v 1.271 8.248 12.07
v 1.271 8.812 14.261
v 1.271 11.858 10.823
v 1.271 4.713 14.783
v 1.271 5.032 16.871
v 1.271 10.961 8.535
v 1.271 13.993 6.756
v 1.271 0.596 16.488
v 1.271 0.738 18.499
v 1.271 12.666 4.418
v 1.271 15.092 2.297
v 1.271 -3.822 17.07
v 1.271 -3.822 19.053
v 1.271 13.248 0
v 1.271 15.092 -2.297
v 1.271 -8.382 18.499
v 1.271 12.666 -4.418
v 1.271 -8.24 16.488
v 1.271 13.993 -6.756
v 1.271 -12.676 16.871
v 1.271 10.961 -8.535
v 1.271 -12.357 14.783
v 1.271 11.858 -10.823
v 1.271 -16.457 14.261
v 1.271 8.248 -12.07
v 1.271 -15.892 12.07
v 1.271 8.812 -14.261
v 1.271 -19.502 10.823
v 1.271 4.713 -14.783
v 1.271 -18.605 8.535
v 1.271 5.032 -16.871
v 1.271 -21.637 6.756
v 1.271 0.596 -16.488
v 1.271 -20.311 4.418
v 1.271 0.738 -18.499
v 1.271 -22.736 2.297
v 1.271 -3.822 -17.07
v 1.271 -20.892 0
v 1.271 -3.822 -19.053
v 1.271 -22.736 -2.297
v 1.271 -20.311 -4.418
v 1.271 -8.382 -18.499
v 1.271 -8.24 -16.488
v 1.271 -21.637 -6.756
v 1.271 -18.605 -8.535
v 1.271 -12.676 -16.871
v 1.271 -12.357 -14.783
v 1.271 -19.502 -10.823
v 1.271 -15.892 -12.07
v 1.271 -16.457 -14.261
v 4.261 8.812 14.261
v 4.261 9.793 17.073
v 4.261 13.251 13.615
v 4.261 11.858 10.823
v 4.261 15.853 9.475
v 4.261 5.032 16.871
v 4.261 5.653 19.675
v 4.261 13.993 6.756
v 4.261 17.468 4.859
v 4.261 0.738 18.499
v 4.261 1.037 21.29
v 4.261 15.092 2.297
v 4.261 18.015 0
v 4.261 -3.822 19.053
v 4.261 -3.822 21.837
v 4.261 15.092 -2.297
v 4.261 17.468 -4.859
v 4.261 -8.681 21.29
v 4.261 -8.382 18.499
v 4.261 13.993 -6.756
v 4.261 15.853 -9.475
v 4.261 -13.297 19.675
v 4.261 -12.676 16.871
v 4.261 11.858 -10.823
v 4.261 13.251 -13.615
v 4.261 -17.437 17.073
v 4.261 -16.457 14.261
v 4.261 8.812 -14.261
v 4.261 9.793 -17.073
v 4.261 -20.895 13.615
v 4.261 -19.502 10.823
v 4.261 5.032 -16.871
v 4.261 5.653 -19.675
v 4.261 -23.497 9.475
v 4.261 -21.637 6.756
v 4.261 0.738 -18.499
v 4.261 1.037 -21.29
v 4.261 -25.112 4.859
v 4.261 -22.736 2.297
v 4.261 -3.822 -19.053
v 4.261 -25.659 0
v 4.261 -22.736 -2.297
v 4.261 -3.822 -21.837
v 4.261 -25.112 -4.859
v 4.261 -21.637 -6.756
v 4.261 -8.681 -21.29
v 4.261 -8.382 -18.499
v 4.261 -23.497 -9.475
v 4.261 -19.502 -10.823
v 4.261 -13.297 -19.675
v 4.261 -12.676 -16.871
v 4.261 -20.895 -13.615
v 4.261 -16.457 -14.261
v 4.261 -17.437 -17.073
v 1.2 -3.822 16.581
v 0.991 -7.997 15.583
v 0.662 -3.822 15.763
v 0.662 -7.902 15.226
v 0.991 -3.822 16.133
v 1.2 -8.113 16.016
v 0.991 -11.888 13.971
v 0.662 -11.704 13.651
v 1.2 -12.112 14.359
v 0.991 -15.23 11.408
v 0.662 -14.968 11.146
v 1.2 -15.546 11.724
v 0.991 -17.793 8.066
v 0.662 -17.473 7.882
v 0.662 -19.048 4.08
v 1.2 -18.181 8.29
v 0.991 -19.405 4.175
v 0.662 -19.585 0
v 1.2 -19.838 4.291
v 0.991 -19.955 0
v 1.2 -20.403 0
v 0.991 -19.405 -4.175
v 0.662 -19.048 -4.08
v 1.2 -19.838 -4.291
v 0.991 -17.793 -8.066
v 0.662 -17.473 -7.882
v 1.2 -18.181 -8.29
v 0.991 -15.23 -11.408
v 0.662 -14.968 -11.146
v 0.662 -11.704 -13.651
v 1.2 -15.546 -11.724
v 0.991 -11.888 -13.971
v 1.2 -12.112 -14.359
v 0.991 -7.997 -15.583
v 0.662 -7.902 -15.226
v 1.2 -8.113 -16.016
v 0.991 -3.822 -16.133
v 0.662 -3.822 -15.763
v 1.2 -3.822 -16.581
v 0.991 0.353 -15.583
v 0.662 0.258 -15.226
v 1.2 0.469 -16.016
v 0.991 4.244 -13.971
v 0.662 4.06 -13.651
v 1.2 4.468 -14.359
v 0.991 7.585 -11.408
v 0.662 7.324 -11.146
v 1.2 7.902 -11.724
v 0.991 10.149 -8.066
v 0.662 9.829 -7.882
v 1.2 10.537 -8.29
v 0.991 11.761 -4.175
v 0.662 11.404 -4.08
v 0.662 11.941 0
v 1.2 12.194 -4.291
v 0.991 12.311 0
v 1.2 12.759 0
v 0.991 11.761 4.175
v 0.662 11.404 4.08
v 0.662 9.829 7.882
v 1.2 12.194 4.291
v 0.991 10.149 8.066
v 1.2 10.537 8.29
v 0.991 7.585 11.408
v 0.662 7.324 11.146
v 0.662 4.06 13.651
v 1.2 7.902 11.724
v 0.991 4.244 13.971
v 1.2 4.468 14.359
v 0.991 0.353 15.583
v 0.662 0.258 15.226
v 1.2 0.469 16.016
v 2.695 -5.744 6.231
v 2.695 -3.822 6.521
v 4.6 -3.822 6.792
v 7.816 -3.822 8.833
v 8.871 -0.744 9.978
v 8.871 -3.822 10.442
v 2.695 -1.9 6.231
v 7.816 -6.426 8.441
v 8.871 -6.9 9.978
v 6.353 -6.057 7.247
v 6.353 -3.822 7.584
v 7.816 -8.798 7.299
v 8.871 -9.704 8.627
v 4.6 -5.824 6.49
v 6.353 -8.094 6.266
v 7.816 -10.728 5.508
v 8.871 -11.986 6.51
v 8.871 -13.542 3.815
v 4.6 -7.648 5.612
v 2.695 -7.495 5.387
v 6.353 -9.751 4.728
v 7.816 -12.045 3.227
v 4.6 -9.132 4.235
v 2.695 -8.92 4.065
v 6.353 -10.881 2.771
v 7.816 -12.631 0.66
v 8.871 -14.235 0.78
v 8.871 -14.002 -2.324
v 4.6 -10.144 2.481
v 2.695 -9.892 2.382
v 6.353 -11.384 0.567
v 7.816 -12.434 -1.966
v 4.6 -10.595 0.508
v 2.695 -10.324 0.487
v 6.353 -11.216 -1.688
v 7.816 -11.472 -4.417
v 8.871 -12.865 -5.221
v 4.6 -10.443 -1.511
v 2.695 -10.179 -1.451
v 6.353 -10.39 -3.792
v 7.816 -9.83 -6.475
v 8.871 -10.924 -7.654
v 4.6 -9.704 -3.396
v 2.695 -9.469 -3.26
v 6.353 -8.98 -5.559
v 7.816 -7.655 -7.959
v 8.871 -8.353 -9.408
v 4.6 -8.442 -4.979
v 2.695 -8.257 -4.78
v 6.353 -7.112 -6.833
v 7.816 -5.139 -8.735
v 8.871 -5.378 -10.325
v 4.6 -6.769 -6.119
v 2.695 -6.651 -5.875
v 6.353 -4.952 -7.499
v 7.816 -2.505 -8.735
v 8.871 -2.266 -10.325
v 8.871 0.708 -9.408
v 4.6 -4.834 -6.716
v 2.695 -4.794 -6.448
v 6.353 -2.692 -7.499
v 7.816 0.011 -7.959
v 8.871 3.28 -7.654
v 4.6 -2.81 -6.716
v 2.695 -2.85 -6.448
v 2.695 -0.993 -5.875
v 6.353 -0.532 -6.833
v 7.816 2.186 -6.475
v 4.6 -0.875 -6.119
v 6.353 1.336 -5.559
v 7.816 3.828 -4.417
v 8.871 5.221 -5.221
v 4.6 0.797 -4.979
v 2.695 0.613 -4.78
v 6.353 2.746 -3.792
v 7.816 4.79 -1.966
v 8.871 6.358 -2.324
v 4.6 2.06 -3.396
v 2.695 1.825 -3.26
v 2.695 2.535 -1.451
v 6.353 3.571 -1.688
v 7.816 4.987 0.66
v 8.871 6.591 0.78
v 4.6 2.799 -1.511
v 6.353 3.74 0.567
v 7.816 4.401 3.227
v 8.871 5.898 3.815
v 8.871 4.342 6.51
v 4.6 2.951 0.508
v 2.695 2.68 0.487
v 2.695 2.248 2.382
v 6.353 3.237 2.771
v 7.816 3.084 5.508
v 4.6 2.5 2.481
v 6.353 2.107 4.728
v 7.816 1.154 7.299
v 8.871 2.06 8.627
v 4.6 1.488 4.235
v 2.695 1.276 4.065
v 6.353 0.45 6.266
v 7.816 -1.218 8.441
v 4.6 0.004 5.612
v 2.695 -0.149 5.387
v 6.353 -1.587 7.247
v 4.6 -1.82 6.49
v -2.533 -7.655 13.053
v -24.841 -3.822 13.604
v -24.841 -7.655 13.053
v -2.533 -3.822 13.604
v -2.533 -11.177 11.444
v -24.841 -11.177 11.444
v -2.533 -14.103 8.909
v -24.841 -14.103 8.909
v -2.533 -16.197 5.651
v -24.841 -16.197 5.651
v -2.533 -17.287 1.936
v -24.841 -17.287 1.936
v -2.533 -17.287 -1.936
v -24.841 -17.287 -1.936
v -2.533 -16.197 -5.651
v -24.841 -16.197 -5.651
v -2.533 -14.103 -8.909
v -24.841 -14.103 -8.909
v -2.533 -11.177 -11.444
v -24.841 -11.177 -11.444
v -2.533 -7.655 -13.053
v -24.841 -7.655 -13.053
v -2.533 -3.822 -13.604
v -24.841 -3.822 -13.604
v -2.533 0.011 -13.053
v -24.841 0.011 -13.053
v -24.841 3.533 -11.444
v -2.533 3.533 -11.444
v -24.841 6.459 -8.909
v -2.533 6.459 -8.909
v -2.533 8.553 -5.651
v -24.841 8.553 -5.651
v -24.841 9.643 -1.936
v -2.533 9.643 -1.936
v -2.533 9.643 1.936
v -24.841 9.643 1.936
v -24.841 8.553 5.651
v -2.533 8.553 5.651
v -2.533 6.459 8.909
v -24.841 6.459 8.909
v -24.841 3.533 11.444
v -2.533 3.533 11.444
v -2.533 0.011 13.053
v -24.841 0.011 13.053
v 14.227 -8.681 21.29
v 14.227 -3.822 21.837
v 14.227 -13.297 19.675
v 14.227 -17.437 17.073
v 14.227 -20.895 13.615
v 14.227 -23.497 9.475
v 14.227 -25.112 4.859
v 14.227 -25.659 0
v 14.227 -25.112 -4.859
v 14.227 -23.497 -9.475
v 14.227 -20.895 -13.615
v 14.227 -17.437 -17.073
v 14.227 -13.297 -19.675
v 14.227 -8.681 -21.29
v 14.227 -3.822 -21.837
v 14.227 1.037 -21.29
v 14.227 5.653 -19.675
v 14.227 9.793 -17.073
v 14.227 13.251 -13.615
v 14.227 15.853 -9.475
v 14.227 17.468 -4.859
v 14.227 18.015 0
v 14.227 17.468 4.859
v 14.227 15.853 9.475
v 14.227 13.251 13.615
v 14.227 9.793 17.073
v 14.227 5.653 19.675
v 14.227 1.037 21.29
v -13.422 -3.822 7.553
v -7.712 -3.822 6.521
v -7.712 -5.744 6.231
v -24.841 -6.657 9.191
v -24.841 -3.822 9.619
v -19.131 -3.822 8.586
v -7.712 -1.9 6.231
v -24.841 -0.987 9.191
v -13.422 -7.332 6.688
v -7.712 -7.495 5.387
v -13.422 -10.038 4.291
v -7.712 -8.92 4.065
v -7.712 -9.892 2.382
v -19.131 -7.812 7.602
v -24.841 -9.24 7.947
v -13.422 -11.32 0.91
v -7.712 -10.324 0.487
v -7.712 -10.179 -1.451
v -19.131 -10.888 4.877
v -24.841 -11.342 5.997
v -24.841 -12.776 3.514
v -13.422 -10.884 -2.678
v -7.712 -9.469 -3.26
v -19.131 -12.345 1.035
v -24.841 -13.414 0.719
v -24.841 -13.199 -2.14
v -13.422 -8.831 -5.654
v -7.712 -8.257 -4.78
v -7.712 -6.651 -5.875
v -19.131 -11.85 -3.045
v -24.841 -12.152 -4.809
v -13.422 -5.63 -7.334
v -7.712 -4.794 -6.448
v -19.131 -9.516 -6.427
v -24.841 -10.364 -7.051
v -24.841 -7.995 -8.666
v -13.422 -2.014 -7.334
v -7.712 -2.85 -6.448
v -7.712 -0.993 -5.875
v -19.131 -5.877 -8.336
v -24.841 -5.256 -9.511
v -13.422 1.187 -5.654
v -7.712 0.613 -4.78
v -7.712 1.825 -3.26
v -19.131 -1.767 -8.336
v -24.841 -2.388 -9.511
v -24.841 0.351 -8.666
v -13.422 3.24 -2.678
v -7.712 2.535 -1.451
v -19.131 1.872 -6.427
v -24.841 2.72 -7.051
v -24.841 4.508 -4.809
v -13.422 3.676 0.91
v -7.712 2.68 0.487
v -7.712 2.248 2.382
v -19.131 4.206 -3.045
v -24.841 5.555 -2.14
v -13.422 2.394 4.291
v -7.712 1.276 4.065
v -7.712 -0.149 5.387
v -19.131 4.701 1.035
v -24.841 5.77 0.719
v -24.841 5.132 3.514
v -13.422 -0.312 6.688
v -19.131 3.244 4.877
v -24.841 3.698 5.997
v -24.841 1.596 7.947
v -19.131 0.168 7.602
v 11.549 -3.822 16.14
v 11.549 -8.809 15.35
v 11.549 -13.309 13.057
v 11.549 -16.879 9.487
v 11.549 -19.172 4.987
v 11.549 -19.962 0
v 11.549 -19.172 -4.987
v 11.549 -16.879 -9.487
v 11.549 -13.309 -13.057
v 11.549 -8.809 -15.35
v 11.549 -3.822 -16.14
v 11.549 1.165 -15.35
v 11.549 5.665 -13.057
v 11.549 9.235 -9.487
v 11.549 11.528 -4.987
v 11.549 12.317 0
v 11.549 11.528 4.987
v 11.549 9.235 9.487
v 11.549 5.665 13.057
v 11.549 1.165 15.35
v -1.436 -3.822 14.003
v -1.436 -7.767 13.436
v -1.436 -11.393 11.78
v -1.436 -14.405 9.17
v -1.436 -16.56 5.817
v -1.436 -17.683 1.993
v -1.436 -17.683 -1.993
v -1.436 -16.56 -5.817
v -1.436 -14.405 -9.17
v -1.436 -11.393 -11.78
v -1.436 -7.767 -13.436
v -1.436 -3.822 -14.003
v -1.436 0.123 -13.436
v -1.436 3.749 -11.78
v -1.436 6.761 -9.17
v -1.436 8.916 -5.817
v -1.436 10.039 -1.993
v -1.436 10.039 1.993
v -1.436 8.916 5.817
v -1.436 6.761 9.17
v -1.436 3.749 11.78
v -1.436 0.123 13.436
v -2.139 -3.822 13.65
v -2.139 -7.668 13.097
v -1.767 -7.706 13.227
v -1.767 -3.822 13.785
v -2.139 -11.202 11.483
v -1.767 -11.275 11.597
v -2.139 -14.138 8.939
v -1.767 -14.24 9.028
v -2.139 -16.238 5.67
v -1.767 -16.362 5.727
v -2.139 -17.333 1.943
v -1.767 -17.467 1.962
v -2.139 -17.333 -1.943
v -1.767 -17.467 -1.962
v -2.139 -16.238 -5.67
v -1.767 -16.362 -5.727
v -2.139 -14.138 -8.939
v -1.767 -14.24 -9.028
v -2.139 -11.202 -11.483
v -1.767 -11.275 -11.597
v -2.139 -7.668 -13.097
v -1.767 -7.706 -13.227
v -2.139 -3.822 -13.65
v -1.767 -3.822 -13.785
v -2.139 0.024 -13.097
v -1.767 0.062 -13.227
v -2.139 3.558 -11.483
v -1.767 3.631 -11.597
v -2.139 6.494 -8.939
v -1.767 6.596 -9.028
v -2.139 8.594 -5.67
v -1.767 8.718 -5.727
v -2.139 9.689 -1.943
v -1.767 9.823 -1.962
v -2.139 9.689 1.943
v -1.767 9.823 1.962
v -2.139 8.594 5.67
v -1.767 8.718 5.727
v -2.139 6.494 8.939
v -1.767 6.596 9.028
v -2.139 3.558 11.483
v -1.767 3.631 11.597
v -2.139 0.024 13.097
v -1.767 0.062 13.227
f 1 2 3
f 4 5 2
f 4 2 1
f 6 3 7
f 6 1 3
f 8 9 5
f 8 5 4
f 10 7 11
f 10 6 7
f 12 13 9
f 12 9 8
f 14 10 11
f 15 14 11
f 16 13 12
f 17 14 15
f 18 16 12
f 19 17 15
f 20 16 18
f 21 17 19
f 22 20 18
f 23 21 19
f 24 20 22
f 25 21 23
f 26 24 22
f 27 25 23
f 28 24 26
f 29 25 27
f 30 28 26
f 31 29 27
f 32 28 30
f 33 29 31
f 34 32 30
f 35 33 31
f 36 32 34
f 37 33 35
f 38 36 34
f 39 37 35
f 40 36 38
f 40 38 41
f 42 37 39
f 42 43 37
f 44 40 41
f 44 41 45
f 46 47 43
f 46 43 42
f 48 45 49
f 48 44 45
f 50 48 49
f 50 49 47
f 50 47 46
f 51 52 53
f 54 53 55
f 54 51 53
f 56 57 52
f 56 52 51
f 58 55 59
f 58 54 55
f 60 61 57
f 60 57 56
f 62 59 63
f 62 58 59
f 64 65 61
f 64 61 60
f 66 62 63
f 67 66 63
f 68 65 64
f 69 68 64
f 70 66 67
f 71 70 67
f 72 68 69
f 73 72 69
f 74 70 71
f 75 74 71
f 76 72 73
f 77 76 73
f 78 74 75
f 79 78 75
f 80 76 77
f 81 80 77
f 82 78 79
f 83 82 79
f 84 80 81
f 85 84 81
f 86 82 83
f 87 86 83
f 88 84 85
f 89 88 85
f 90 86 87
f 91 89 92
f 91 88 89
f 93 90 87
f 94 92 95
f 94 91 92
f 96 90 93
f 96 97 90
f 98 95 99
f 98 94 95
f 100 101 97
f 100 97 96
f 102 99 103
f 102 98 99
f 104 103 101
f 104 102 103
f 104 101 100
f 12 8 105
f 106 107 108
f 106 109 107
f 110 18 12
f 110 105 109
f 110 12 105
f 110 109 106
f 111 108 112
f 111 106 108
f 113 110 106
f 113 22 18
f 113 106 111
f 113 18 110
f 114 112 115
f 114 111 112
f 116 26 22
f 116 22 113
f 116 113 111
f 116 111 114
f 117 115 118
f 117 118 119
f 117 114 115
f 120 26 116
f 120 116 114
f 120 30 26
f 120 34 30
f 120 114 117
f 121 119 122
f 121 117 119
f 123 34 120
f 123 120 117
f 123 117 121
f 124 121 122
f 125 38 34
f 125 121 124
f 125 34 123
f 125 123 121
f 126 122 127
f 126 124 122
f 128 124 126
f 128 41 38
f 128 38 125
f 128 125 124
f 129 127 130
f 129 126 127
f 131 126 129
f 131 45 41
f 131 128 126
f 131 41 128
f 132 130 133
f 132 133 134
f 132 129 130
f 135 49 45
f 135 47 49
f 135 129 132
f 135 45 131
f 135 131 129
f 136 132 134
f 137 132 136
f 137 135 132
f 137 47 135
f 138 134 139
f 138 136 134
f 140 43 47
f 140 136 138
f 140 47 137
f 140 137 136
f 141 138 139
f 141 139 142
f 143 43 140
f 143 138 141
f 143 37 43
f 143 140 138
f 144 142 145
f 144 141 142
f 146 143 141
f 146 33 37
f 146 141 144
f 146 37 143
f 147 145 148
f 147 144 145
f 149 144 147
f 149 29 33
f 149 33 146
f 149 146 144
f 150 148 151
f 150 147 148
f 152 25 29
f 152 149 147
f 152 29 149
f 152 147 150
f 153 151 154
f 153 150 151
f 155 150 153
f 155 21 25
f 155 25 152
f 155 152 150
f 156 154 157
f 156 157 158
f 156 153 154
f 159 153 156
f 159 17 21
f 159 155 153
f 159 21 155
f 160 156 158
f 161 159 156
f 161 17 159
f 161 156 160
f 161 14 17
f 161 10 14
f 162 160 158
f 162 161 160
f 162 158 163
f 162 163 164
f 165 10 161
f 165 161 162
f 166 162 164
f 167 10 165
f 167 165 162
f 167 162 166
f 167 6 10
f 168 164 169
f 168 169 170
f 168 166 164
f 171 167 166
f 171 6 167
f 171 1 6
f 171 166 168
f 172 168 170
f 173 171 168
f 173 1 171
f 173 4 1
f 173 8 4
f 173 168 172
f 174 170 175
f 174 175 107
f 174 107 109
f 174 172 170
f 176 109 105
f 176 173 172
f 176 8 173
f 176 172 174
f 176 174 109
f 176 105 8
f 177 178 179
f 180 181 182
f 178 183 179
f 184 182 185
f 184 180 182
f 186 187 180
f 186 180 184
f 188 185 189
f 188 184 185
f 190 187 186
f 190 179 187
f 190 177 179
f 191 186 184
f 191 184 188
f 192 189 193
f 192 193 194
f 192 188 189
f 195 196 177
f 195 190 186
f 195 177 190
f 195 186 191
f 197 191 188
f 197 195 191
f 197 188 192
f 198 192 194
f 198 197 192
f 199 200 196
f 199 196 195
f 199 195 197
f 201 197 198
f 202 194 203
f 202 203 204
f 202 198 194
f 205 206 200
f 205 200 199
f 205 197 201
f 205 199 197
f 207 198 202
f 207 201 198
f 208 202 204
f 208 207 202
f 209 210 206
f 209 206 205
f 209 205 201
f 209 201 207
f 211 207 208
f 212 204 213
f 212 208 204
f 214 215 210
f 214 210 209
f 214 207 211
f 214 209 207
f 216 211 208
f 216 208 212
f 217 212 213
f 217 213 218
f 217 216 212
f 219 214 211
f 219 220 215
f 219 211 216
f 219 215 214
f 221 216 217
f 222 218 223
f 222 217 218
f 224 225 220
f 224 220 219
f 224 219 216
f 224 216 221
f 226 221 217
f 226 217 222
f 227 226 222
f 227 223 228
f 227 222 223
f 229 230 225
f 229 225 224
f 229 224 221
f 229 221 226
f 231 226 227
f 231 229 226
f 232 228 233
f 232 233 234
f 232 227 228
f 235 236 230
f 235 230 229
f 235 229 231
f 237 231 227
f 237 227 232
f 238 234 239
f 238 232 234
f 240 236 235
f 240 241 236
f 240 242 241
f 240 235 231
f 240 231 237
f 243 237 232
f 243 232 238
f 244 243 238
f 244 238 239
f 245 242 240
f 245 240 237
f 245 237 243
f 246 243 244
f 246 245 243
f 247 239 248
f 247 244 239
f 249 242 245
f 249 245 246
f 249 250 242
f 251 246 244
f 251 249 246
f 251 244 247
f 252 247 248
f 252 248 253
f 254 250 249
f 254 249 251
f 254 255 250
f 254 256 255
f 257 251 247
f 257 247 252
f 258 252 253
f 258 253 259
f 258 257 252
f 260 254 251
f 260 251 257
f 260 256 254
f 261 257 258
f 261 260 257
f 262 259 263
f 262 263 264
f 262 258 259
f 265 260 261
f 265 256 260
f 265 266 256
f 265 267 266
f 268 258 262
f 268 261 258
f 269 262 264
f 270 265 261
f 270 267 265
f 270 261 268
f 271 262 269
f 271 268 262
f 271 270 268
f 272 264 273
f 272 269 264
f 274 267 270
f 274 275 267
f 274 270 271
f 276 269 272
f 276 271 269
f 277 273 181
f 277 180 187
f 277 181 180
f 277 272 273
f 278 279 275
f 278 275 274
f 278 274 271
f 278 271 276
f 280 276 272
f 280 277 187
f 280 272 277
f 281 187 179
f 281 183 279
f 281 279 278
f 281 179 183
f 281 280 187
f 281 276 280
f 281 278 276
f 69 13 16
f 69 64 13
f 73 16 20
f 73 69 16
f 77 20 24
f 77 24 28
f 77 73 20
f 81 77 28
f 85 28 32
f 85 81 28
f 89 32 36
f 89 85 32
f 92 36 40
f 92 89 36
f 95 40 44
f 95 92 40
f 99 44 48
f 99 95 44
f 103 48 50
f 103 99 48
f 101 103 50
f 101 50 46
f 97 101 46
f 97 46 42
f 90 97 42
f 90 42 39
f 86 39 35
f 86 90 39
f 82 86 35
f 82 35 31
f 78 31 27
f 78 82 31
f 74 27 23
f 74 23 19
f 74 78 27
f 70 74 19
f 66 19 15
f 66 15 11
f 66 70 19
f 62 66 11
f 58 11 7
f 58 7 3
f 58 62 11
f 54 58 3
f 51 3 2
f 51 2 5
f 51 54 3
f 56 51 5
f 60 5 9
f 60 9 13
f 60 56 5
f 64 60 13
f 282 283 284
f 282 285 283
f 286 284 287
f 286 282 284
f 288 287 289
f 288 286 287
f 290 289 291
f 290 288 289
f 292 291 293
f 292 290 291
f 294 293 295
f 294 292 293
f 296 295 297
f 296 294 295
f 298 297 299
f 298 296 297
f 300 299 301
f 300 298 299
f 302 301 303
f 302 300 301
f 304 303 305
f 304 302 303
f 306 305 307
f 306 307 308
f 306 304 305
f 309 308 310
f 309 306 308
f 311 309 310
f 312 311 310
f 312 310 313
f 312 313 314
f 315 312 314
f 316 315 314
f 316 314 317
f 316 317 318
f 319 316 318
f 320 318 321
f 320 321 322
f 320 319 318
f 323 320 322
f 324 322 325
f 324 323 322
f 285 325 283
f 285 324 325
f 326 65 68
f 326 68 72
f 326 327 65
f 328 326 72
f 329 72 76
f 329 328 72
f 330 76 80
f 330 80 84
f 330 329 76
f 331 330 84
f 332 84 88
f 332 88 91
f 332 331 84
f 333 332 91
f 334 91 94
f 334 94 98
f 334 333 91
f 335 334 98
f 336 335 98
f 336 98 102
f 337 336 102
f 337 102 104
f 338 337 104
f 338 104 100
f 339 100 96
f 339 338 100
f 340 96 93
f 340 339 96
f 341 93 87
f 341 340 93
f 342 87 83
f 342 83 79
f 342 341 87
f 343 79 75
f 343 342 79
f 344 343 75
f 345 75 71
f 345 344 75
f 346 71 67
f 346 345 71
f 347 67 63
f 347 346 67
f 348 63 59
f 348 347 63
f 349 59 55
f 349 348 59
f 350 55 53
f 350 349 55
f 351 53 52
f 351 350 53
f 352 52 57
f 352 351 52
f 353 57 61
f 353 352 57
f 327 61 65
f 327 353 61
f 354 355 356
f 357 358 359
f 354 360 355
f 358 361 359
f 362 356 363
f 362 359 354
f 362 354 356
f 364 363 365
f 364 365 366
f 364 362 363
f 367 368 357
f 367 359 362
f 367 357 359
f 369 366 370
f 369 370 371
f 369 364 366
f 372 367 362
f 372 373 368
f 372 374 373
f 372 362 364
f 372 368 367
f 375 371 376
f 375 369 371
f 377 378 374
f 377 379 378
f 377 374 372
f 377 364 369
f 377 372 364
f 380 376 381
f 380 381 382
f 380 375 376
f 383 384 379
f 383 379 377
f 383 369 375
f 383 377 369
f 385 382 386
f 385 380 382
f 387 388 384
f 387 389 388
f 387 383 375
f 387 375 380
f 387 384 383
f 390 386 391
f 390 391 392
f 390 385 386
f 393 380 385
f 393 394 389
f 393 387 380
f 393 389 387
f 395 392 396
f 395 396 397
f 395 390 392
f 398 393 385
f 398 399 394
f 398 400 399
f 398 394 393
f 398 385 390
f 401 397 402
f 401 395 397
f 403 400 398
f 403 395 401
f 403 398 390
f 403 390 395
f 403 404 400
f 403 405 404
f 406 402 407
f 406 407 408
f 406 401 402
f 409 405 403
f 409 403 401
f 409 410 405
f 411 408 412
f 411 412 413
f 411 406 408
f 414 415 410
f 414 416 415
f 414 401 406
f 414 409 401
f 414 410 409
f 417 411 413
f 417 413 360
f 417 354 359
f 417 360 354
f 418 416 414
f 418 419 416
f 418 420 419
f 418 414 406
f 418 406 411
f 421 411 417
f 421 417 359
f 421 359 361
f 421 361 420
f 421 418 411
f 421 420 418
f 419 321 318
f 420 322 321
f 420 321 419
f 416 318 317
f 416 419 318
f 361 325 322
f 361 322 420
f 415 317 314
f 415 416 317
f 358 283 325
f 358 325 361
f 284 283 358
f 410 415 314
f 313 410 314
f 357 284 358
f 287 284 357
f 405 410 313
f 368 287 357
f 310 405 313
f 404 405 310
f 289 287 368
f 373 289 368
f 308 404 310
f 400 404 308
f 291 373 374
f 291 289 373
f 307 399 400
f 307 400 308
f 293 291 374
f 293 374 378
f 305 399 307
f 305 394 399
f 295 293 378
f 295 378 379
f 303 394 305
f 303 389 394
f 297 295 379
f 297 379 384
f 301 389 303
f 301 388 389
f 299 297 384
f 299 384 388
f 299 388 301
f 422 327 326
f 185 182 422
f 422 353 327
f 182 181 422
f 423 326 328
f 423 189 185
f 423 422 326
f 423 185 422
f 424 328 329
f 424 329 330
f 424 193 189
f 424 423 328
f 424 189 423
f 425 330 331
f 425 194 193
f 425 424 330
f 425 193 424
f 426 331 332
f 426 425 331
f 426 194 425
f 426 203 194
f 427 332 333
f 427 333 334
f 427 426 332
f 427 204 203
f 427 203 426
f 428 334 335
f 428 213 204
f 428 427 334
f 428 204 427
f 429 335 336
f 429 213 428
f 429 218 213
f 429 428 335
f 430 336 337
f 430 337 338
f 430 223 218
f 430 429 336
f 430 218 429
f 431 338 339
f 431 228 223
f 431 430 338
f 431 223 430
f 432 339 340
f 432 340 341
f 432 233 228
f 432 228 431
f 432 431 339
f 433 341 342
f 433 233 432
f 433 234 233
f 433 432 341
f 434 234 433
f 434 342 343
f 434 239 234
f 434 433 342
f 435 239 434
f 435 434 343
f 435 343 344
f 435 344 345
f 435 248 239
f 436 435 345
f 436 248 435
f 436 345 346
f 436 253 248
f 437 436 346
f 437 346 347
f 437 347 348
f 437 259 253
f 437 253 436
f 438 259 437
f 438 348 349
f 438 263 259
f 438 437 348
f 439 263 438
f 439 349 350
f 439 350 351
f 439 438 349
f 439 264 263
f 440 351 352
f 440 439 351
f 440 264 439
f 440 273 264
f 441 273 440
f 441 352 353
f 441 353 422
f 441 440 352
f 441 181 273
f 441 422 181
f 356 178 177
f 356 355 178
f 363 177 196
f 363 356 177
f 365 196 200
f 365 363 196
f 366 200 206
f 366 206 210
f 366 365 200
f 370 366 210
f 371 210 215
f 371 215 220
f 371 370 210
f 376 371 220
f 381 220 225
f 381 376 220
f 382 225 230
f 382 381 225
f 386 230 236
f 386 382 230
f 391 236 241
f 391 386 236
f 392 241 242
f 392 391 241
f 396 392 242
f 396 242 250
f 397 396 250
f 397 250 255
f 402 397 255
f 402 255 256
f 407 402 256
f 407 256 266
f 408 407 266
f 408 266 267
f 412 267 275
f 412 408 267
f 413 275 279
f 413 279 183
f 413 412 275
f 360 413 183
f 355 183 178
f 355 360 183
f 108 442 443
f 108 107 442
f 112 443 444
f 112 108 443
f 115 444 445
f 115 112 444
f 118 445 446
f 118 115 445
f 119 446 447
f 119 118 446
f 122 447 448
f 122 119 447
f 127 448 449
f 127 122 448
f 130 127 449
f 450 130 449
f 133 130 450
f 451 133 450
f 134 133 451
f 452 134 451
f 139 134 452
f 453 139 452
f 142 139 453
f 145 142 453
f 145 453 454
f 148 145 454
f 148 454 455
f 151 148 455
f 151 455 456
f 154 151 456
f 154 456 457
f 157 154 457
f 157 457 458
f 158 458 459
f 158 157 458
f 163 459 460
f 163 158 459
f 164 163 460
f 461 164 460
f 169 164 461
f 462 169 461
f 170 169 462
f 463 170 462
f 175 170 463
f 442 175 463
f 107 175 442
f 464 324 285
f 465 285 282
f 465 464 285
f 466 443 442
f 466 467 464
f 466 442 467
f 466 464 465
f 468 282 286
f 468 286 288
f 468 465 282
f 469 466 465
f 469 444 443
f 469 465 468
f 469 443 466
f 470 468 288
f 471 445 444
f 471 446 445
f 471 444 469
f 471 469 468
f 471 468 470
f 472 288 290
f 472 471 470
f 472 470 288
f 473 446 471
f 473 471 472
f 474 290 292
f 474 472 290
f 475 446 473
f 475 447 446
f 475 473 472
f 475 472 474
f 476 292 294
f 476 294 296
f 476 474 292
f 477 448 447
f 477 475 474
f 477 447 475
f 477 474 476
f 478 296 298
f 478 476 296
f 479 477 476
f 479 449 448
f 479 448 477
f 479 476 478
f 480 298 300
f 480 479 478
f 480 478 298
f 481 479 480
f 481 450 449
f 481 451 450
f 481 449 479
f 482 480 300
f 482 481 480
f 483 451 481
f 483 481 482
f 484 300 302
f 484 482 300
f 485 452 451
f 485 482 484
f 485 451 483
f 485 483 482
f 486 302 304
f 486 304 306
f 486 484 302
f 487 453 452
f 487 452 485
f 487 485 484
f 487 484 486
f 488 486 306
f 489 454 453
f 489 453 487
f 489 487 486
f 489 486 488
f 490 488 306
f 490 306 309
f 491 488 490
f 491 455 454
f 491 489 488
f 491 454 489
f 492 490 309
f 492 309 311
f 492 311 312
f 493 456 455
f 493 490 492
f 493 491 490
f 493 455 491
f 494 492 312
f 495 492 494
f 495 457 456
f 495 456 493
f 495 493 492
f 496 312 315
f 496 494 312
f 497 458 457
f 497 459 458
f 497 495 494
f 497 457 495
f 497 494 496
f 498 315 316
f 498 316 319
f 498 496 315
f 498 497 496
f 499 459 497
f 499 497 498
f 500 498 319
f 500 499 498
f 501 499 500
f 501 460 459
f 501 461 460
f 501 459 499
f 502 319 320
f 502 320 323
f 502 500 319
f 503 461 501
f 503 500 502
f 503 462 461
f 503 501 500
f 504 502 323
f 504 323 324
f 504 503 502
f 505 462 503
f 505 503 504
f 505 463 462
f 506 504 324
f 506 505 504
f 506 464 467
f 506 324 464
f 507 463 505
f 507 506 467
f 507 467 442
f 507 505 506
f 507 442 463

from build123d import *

# Parameters (mm, degrees)
SCALE1_SCALE = 1.70603675


with BuildPart() as part:
    # Esquisse1 → Révolution1 (revolve)
    with BuildSketch(Plane.XY, mode=Mode.PRIVATE) as r_volution1_sk:
        with BuildLine():
            Line((1.981656821, 8.97797736), (7.823456821, 8.97797736))
            Line((7.823456821, 8.97797736), (4.683813218, 2.298439639))
            ThreePointArc((4.683813218, 2.298439639), (3.207806254, 0.623149289), (1.06377284, 0))
            Line((1.06377284, 0), (0.803456821, 0))
            Line((0.803456821, 0), (-5.036543179, 0))
            Line((-5.036543179, 0), (-15.076543179, 1.81597736))
            Line((-15.076543179, 1.81597736), (-15.076543179, 4.15197736))
            Line((-15.076543179, 4.15197736), (-2.000513414, 4.15197736))
            ThreePointArc((-2.000513414, 4.15197736), (-1.65849327, 4.212284739), (-1.357725804, 4.385932917))
            Line((-1.357725804, 4.385932917), (-0.12815557, 5.417664847))
            ThreePointArc((-0.12815557, 5.417664847), (0.135364608, 5.761091028), (0.229056821, 6.18370929))
            Line((0.229056821, 6.18370929), (0.229056821, 7.34597736))
            Line((0.229056821, 7.34597736), (1.981656821, 7.34597736))
            Line((1.981656821, 7.34597736), (1.981656821, 8.97797736))
        make_face()
    revolve(r_volution1_sk.sketch.rotate(Axis((-19.476947674, -3.82202264, 0), (1, 0, 0)), 90), axis=Axis((-19.476947674, -3.82202264, 0), (1, 0, 0)))


with BuildPart() as part_1:
    # Scale1: scaled about (-1.246951402, -3.82202264, 0)
    add(part.part.scale(SCALE1_SCALE).moved(Location((0.880393515, 2.698488443, 0))))


solid = part_1.part
